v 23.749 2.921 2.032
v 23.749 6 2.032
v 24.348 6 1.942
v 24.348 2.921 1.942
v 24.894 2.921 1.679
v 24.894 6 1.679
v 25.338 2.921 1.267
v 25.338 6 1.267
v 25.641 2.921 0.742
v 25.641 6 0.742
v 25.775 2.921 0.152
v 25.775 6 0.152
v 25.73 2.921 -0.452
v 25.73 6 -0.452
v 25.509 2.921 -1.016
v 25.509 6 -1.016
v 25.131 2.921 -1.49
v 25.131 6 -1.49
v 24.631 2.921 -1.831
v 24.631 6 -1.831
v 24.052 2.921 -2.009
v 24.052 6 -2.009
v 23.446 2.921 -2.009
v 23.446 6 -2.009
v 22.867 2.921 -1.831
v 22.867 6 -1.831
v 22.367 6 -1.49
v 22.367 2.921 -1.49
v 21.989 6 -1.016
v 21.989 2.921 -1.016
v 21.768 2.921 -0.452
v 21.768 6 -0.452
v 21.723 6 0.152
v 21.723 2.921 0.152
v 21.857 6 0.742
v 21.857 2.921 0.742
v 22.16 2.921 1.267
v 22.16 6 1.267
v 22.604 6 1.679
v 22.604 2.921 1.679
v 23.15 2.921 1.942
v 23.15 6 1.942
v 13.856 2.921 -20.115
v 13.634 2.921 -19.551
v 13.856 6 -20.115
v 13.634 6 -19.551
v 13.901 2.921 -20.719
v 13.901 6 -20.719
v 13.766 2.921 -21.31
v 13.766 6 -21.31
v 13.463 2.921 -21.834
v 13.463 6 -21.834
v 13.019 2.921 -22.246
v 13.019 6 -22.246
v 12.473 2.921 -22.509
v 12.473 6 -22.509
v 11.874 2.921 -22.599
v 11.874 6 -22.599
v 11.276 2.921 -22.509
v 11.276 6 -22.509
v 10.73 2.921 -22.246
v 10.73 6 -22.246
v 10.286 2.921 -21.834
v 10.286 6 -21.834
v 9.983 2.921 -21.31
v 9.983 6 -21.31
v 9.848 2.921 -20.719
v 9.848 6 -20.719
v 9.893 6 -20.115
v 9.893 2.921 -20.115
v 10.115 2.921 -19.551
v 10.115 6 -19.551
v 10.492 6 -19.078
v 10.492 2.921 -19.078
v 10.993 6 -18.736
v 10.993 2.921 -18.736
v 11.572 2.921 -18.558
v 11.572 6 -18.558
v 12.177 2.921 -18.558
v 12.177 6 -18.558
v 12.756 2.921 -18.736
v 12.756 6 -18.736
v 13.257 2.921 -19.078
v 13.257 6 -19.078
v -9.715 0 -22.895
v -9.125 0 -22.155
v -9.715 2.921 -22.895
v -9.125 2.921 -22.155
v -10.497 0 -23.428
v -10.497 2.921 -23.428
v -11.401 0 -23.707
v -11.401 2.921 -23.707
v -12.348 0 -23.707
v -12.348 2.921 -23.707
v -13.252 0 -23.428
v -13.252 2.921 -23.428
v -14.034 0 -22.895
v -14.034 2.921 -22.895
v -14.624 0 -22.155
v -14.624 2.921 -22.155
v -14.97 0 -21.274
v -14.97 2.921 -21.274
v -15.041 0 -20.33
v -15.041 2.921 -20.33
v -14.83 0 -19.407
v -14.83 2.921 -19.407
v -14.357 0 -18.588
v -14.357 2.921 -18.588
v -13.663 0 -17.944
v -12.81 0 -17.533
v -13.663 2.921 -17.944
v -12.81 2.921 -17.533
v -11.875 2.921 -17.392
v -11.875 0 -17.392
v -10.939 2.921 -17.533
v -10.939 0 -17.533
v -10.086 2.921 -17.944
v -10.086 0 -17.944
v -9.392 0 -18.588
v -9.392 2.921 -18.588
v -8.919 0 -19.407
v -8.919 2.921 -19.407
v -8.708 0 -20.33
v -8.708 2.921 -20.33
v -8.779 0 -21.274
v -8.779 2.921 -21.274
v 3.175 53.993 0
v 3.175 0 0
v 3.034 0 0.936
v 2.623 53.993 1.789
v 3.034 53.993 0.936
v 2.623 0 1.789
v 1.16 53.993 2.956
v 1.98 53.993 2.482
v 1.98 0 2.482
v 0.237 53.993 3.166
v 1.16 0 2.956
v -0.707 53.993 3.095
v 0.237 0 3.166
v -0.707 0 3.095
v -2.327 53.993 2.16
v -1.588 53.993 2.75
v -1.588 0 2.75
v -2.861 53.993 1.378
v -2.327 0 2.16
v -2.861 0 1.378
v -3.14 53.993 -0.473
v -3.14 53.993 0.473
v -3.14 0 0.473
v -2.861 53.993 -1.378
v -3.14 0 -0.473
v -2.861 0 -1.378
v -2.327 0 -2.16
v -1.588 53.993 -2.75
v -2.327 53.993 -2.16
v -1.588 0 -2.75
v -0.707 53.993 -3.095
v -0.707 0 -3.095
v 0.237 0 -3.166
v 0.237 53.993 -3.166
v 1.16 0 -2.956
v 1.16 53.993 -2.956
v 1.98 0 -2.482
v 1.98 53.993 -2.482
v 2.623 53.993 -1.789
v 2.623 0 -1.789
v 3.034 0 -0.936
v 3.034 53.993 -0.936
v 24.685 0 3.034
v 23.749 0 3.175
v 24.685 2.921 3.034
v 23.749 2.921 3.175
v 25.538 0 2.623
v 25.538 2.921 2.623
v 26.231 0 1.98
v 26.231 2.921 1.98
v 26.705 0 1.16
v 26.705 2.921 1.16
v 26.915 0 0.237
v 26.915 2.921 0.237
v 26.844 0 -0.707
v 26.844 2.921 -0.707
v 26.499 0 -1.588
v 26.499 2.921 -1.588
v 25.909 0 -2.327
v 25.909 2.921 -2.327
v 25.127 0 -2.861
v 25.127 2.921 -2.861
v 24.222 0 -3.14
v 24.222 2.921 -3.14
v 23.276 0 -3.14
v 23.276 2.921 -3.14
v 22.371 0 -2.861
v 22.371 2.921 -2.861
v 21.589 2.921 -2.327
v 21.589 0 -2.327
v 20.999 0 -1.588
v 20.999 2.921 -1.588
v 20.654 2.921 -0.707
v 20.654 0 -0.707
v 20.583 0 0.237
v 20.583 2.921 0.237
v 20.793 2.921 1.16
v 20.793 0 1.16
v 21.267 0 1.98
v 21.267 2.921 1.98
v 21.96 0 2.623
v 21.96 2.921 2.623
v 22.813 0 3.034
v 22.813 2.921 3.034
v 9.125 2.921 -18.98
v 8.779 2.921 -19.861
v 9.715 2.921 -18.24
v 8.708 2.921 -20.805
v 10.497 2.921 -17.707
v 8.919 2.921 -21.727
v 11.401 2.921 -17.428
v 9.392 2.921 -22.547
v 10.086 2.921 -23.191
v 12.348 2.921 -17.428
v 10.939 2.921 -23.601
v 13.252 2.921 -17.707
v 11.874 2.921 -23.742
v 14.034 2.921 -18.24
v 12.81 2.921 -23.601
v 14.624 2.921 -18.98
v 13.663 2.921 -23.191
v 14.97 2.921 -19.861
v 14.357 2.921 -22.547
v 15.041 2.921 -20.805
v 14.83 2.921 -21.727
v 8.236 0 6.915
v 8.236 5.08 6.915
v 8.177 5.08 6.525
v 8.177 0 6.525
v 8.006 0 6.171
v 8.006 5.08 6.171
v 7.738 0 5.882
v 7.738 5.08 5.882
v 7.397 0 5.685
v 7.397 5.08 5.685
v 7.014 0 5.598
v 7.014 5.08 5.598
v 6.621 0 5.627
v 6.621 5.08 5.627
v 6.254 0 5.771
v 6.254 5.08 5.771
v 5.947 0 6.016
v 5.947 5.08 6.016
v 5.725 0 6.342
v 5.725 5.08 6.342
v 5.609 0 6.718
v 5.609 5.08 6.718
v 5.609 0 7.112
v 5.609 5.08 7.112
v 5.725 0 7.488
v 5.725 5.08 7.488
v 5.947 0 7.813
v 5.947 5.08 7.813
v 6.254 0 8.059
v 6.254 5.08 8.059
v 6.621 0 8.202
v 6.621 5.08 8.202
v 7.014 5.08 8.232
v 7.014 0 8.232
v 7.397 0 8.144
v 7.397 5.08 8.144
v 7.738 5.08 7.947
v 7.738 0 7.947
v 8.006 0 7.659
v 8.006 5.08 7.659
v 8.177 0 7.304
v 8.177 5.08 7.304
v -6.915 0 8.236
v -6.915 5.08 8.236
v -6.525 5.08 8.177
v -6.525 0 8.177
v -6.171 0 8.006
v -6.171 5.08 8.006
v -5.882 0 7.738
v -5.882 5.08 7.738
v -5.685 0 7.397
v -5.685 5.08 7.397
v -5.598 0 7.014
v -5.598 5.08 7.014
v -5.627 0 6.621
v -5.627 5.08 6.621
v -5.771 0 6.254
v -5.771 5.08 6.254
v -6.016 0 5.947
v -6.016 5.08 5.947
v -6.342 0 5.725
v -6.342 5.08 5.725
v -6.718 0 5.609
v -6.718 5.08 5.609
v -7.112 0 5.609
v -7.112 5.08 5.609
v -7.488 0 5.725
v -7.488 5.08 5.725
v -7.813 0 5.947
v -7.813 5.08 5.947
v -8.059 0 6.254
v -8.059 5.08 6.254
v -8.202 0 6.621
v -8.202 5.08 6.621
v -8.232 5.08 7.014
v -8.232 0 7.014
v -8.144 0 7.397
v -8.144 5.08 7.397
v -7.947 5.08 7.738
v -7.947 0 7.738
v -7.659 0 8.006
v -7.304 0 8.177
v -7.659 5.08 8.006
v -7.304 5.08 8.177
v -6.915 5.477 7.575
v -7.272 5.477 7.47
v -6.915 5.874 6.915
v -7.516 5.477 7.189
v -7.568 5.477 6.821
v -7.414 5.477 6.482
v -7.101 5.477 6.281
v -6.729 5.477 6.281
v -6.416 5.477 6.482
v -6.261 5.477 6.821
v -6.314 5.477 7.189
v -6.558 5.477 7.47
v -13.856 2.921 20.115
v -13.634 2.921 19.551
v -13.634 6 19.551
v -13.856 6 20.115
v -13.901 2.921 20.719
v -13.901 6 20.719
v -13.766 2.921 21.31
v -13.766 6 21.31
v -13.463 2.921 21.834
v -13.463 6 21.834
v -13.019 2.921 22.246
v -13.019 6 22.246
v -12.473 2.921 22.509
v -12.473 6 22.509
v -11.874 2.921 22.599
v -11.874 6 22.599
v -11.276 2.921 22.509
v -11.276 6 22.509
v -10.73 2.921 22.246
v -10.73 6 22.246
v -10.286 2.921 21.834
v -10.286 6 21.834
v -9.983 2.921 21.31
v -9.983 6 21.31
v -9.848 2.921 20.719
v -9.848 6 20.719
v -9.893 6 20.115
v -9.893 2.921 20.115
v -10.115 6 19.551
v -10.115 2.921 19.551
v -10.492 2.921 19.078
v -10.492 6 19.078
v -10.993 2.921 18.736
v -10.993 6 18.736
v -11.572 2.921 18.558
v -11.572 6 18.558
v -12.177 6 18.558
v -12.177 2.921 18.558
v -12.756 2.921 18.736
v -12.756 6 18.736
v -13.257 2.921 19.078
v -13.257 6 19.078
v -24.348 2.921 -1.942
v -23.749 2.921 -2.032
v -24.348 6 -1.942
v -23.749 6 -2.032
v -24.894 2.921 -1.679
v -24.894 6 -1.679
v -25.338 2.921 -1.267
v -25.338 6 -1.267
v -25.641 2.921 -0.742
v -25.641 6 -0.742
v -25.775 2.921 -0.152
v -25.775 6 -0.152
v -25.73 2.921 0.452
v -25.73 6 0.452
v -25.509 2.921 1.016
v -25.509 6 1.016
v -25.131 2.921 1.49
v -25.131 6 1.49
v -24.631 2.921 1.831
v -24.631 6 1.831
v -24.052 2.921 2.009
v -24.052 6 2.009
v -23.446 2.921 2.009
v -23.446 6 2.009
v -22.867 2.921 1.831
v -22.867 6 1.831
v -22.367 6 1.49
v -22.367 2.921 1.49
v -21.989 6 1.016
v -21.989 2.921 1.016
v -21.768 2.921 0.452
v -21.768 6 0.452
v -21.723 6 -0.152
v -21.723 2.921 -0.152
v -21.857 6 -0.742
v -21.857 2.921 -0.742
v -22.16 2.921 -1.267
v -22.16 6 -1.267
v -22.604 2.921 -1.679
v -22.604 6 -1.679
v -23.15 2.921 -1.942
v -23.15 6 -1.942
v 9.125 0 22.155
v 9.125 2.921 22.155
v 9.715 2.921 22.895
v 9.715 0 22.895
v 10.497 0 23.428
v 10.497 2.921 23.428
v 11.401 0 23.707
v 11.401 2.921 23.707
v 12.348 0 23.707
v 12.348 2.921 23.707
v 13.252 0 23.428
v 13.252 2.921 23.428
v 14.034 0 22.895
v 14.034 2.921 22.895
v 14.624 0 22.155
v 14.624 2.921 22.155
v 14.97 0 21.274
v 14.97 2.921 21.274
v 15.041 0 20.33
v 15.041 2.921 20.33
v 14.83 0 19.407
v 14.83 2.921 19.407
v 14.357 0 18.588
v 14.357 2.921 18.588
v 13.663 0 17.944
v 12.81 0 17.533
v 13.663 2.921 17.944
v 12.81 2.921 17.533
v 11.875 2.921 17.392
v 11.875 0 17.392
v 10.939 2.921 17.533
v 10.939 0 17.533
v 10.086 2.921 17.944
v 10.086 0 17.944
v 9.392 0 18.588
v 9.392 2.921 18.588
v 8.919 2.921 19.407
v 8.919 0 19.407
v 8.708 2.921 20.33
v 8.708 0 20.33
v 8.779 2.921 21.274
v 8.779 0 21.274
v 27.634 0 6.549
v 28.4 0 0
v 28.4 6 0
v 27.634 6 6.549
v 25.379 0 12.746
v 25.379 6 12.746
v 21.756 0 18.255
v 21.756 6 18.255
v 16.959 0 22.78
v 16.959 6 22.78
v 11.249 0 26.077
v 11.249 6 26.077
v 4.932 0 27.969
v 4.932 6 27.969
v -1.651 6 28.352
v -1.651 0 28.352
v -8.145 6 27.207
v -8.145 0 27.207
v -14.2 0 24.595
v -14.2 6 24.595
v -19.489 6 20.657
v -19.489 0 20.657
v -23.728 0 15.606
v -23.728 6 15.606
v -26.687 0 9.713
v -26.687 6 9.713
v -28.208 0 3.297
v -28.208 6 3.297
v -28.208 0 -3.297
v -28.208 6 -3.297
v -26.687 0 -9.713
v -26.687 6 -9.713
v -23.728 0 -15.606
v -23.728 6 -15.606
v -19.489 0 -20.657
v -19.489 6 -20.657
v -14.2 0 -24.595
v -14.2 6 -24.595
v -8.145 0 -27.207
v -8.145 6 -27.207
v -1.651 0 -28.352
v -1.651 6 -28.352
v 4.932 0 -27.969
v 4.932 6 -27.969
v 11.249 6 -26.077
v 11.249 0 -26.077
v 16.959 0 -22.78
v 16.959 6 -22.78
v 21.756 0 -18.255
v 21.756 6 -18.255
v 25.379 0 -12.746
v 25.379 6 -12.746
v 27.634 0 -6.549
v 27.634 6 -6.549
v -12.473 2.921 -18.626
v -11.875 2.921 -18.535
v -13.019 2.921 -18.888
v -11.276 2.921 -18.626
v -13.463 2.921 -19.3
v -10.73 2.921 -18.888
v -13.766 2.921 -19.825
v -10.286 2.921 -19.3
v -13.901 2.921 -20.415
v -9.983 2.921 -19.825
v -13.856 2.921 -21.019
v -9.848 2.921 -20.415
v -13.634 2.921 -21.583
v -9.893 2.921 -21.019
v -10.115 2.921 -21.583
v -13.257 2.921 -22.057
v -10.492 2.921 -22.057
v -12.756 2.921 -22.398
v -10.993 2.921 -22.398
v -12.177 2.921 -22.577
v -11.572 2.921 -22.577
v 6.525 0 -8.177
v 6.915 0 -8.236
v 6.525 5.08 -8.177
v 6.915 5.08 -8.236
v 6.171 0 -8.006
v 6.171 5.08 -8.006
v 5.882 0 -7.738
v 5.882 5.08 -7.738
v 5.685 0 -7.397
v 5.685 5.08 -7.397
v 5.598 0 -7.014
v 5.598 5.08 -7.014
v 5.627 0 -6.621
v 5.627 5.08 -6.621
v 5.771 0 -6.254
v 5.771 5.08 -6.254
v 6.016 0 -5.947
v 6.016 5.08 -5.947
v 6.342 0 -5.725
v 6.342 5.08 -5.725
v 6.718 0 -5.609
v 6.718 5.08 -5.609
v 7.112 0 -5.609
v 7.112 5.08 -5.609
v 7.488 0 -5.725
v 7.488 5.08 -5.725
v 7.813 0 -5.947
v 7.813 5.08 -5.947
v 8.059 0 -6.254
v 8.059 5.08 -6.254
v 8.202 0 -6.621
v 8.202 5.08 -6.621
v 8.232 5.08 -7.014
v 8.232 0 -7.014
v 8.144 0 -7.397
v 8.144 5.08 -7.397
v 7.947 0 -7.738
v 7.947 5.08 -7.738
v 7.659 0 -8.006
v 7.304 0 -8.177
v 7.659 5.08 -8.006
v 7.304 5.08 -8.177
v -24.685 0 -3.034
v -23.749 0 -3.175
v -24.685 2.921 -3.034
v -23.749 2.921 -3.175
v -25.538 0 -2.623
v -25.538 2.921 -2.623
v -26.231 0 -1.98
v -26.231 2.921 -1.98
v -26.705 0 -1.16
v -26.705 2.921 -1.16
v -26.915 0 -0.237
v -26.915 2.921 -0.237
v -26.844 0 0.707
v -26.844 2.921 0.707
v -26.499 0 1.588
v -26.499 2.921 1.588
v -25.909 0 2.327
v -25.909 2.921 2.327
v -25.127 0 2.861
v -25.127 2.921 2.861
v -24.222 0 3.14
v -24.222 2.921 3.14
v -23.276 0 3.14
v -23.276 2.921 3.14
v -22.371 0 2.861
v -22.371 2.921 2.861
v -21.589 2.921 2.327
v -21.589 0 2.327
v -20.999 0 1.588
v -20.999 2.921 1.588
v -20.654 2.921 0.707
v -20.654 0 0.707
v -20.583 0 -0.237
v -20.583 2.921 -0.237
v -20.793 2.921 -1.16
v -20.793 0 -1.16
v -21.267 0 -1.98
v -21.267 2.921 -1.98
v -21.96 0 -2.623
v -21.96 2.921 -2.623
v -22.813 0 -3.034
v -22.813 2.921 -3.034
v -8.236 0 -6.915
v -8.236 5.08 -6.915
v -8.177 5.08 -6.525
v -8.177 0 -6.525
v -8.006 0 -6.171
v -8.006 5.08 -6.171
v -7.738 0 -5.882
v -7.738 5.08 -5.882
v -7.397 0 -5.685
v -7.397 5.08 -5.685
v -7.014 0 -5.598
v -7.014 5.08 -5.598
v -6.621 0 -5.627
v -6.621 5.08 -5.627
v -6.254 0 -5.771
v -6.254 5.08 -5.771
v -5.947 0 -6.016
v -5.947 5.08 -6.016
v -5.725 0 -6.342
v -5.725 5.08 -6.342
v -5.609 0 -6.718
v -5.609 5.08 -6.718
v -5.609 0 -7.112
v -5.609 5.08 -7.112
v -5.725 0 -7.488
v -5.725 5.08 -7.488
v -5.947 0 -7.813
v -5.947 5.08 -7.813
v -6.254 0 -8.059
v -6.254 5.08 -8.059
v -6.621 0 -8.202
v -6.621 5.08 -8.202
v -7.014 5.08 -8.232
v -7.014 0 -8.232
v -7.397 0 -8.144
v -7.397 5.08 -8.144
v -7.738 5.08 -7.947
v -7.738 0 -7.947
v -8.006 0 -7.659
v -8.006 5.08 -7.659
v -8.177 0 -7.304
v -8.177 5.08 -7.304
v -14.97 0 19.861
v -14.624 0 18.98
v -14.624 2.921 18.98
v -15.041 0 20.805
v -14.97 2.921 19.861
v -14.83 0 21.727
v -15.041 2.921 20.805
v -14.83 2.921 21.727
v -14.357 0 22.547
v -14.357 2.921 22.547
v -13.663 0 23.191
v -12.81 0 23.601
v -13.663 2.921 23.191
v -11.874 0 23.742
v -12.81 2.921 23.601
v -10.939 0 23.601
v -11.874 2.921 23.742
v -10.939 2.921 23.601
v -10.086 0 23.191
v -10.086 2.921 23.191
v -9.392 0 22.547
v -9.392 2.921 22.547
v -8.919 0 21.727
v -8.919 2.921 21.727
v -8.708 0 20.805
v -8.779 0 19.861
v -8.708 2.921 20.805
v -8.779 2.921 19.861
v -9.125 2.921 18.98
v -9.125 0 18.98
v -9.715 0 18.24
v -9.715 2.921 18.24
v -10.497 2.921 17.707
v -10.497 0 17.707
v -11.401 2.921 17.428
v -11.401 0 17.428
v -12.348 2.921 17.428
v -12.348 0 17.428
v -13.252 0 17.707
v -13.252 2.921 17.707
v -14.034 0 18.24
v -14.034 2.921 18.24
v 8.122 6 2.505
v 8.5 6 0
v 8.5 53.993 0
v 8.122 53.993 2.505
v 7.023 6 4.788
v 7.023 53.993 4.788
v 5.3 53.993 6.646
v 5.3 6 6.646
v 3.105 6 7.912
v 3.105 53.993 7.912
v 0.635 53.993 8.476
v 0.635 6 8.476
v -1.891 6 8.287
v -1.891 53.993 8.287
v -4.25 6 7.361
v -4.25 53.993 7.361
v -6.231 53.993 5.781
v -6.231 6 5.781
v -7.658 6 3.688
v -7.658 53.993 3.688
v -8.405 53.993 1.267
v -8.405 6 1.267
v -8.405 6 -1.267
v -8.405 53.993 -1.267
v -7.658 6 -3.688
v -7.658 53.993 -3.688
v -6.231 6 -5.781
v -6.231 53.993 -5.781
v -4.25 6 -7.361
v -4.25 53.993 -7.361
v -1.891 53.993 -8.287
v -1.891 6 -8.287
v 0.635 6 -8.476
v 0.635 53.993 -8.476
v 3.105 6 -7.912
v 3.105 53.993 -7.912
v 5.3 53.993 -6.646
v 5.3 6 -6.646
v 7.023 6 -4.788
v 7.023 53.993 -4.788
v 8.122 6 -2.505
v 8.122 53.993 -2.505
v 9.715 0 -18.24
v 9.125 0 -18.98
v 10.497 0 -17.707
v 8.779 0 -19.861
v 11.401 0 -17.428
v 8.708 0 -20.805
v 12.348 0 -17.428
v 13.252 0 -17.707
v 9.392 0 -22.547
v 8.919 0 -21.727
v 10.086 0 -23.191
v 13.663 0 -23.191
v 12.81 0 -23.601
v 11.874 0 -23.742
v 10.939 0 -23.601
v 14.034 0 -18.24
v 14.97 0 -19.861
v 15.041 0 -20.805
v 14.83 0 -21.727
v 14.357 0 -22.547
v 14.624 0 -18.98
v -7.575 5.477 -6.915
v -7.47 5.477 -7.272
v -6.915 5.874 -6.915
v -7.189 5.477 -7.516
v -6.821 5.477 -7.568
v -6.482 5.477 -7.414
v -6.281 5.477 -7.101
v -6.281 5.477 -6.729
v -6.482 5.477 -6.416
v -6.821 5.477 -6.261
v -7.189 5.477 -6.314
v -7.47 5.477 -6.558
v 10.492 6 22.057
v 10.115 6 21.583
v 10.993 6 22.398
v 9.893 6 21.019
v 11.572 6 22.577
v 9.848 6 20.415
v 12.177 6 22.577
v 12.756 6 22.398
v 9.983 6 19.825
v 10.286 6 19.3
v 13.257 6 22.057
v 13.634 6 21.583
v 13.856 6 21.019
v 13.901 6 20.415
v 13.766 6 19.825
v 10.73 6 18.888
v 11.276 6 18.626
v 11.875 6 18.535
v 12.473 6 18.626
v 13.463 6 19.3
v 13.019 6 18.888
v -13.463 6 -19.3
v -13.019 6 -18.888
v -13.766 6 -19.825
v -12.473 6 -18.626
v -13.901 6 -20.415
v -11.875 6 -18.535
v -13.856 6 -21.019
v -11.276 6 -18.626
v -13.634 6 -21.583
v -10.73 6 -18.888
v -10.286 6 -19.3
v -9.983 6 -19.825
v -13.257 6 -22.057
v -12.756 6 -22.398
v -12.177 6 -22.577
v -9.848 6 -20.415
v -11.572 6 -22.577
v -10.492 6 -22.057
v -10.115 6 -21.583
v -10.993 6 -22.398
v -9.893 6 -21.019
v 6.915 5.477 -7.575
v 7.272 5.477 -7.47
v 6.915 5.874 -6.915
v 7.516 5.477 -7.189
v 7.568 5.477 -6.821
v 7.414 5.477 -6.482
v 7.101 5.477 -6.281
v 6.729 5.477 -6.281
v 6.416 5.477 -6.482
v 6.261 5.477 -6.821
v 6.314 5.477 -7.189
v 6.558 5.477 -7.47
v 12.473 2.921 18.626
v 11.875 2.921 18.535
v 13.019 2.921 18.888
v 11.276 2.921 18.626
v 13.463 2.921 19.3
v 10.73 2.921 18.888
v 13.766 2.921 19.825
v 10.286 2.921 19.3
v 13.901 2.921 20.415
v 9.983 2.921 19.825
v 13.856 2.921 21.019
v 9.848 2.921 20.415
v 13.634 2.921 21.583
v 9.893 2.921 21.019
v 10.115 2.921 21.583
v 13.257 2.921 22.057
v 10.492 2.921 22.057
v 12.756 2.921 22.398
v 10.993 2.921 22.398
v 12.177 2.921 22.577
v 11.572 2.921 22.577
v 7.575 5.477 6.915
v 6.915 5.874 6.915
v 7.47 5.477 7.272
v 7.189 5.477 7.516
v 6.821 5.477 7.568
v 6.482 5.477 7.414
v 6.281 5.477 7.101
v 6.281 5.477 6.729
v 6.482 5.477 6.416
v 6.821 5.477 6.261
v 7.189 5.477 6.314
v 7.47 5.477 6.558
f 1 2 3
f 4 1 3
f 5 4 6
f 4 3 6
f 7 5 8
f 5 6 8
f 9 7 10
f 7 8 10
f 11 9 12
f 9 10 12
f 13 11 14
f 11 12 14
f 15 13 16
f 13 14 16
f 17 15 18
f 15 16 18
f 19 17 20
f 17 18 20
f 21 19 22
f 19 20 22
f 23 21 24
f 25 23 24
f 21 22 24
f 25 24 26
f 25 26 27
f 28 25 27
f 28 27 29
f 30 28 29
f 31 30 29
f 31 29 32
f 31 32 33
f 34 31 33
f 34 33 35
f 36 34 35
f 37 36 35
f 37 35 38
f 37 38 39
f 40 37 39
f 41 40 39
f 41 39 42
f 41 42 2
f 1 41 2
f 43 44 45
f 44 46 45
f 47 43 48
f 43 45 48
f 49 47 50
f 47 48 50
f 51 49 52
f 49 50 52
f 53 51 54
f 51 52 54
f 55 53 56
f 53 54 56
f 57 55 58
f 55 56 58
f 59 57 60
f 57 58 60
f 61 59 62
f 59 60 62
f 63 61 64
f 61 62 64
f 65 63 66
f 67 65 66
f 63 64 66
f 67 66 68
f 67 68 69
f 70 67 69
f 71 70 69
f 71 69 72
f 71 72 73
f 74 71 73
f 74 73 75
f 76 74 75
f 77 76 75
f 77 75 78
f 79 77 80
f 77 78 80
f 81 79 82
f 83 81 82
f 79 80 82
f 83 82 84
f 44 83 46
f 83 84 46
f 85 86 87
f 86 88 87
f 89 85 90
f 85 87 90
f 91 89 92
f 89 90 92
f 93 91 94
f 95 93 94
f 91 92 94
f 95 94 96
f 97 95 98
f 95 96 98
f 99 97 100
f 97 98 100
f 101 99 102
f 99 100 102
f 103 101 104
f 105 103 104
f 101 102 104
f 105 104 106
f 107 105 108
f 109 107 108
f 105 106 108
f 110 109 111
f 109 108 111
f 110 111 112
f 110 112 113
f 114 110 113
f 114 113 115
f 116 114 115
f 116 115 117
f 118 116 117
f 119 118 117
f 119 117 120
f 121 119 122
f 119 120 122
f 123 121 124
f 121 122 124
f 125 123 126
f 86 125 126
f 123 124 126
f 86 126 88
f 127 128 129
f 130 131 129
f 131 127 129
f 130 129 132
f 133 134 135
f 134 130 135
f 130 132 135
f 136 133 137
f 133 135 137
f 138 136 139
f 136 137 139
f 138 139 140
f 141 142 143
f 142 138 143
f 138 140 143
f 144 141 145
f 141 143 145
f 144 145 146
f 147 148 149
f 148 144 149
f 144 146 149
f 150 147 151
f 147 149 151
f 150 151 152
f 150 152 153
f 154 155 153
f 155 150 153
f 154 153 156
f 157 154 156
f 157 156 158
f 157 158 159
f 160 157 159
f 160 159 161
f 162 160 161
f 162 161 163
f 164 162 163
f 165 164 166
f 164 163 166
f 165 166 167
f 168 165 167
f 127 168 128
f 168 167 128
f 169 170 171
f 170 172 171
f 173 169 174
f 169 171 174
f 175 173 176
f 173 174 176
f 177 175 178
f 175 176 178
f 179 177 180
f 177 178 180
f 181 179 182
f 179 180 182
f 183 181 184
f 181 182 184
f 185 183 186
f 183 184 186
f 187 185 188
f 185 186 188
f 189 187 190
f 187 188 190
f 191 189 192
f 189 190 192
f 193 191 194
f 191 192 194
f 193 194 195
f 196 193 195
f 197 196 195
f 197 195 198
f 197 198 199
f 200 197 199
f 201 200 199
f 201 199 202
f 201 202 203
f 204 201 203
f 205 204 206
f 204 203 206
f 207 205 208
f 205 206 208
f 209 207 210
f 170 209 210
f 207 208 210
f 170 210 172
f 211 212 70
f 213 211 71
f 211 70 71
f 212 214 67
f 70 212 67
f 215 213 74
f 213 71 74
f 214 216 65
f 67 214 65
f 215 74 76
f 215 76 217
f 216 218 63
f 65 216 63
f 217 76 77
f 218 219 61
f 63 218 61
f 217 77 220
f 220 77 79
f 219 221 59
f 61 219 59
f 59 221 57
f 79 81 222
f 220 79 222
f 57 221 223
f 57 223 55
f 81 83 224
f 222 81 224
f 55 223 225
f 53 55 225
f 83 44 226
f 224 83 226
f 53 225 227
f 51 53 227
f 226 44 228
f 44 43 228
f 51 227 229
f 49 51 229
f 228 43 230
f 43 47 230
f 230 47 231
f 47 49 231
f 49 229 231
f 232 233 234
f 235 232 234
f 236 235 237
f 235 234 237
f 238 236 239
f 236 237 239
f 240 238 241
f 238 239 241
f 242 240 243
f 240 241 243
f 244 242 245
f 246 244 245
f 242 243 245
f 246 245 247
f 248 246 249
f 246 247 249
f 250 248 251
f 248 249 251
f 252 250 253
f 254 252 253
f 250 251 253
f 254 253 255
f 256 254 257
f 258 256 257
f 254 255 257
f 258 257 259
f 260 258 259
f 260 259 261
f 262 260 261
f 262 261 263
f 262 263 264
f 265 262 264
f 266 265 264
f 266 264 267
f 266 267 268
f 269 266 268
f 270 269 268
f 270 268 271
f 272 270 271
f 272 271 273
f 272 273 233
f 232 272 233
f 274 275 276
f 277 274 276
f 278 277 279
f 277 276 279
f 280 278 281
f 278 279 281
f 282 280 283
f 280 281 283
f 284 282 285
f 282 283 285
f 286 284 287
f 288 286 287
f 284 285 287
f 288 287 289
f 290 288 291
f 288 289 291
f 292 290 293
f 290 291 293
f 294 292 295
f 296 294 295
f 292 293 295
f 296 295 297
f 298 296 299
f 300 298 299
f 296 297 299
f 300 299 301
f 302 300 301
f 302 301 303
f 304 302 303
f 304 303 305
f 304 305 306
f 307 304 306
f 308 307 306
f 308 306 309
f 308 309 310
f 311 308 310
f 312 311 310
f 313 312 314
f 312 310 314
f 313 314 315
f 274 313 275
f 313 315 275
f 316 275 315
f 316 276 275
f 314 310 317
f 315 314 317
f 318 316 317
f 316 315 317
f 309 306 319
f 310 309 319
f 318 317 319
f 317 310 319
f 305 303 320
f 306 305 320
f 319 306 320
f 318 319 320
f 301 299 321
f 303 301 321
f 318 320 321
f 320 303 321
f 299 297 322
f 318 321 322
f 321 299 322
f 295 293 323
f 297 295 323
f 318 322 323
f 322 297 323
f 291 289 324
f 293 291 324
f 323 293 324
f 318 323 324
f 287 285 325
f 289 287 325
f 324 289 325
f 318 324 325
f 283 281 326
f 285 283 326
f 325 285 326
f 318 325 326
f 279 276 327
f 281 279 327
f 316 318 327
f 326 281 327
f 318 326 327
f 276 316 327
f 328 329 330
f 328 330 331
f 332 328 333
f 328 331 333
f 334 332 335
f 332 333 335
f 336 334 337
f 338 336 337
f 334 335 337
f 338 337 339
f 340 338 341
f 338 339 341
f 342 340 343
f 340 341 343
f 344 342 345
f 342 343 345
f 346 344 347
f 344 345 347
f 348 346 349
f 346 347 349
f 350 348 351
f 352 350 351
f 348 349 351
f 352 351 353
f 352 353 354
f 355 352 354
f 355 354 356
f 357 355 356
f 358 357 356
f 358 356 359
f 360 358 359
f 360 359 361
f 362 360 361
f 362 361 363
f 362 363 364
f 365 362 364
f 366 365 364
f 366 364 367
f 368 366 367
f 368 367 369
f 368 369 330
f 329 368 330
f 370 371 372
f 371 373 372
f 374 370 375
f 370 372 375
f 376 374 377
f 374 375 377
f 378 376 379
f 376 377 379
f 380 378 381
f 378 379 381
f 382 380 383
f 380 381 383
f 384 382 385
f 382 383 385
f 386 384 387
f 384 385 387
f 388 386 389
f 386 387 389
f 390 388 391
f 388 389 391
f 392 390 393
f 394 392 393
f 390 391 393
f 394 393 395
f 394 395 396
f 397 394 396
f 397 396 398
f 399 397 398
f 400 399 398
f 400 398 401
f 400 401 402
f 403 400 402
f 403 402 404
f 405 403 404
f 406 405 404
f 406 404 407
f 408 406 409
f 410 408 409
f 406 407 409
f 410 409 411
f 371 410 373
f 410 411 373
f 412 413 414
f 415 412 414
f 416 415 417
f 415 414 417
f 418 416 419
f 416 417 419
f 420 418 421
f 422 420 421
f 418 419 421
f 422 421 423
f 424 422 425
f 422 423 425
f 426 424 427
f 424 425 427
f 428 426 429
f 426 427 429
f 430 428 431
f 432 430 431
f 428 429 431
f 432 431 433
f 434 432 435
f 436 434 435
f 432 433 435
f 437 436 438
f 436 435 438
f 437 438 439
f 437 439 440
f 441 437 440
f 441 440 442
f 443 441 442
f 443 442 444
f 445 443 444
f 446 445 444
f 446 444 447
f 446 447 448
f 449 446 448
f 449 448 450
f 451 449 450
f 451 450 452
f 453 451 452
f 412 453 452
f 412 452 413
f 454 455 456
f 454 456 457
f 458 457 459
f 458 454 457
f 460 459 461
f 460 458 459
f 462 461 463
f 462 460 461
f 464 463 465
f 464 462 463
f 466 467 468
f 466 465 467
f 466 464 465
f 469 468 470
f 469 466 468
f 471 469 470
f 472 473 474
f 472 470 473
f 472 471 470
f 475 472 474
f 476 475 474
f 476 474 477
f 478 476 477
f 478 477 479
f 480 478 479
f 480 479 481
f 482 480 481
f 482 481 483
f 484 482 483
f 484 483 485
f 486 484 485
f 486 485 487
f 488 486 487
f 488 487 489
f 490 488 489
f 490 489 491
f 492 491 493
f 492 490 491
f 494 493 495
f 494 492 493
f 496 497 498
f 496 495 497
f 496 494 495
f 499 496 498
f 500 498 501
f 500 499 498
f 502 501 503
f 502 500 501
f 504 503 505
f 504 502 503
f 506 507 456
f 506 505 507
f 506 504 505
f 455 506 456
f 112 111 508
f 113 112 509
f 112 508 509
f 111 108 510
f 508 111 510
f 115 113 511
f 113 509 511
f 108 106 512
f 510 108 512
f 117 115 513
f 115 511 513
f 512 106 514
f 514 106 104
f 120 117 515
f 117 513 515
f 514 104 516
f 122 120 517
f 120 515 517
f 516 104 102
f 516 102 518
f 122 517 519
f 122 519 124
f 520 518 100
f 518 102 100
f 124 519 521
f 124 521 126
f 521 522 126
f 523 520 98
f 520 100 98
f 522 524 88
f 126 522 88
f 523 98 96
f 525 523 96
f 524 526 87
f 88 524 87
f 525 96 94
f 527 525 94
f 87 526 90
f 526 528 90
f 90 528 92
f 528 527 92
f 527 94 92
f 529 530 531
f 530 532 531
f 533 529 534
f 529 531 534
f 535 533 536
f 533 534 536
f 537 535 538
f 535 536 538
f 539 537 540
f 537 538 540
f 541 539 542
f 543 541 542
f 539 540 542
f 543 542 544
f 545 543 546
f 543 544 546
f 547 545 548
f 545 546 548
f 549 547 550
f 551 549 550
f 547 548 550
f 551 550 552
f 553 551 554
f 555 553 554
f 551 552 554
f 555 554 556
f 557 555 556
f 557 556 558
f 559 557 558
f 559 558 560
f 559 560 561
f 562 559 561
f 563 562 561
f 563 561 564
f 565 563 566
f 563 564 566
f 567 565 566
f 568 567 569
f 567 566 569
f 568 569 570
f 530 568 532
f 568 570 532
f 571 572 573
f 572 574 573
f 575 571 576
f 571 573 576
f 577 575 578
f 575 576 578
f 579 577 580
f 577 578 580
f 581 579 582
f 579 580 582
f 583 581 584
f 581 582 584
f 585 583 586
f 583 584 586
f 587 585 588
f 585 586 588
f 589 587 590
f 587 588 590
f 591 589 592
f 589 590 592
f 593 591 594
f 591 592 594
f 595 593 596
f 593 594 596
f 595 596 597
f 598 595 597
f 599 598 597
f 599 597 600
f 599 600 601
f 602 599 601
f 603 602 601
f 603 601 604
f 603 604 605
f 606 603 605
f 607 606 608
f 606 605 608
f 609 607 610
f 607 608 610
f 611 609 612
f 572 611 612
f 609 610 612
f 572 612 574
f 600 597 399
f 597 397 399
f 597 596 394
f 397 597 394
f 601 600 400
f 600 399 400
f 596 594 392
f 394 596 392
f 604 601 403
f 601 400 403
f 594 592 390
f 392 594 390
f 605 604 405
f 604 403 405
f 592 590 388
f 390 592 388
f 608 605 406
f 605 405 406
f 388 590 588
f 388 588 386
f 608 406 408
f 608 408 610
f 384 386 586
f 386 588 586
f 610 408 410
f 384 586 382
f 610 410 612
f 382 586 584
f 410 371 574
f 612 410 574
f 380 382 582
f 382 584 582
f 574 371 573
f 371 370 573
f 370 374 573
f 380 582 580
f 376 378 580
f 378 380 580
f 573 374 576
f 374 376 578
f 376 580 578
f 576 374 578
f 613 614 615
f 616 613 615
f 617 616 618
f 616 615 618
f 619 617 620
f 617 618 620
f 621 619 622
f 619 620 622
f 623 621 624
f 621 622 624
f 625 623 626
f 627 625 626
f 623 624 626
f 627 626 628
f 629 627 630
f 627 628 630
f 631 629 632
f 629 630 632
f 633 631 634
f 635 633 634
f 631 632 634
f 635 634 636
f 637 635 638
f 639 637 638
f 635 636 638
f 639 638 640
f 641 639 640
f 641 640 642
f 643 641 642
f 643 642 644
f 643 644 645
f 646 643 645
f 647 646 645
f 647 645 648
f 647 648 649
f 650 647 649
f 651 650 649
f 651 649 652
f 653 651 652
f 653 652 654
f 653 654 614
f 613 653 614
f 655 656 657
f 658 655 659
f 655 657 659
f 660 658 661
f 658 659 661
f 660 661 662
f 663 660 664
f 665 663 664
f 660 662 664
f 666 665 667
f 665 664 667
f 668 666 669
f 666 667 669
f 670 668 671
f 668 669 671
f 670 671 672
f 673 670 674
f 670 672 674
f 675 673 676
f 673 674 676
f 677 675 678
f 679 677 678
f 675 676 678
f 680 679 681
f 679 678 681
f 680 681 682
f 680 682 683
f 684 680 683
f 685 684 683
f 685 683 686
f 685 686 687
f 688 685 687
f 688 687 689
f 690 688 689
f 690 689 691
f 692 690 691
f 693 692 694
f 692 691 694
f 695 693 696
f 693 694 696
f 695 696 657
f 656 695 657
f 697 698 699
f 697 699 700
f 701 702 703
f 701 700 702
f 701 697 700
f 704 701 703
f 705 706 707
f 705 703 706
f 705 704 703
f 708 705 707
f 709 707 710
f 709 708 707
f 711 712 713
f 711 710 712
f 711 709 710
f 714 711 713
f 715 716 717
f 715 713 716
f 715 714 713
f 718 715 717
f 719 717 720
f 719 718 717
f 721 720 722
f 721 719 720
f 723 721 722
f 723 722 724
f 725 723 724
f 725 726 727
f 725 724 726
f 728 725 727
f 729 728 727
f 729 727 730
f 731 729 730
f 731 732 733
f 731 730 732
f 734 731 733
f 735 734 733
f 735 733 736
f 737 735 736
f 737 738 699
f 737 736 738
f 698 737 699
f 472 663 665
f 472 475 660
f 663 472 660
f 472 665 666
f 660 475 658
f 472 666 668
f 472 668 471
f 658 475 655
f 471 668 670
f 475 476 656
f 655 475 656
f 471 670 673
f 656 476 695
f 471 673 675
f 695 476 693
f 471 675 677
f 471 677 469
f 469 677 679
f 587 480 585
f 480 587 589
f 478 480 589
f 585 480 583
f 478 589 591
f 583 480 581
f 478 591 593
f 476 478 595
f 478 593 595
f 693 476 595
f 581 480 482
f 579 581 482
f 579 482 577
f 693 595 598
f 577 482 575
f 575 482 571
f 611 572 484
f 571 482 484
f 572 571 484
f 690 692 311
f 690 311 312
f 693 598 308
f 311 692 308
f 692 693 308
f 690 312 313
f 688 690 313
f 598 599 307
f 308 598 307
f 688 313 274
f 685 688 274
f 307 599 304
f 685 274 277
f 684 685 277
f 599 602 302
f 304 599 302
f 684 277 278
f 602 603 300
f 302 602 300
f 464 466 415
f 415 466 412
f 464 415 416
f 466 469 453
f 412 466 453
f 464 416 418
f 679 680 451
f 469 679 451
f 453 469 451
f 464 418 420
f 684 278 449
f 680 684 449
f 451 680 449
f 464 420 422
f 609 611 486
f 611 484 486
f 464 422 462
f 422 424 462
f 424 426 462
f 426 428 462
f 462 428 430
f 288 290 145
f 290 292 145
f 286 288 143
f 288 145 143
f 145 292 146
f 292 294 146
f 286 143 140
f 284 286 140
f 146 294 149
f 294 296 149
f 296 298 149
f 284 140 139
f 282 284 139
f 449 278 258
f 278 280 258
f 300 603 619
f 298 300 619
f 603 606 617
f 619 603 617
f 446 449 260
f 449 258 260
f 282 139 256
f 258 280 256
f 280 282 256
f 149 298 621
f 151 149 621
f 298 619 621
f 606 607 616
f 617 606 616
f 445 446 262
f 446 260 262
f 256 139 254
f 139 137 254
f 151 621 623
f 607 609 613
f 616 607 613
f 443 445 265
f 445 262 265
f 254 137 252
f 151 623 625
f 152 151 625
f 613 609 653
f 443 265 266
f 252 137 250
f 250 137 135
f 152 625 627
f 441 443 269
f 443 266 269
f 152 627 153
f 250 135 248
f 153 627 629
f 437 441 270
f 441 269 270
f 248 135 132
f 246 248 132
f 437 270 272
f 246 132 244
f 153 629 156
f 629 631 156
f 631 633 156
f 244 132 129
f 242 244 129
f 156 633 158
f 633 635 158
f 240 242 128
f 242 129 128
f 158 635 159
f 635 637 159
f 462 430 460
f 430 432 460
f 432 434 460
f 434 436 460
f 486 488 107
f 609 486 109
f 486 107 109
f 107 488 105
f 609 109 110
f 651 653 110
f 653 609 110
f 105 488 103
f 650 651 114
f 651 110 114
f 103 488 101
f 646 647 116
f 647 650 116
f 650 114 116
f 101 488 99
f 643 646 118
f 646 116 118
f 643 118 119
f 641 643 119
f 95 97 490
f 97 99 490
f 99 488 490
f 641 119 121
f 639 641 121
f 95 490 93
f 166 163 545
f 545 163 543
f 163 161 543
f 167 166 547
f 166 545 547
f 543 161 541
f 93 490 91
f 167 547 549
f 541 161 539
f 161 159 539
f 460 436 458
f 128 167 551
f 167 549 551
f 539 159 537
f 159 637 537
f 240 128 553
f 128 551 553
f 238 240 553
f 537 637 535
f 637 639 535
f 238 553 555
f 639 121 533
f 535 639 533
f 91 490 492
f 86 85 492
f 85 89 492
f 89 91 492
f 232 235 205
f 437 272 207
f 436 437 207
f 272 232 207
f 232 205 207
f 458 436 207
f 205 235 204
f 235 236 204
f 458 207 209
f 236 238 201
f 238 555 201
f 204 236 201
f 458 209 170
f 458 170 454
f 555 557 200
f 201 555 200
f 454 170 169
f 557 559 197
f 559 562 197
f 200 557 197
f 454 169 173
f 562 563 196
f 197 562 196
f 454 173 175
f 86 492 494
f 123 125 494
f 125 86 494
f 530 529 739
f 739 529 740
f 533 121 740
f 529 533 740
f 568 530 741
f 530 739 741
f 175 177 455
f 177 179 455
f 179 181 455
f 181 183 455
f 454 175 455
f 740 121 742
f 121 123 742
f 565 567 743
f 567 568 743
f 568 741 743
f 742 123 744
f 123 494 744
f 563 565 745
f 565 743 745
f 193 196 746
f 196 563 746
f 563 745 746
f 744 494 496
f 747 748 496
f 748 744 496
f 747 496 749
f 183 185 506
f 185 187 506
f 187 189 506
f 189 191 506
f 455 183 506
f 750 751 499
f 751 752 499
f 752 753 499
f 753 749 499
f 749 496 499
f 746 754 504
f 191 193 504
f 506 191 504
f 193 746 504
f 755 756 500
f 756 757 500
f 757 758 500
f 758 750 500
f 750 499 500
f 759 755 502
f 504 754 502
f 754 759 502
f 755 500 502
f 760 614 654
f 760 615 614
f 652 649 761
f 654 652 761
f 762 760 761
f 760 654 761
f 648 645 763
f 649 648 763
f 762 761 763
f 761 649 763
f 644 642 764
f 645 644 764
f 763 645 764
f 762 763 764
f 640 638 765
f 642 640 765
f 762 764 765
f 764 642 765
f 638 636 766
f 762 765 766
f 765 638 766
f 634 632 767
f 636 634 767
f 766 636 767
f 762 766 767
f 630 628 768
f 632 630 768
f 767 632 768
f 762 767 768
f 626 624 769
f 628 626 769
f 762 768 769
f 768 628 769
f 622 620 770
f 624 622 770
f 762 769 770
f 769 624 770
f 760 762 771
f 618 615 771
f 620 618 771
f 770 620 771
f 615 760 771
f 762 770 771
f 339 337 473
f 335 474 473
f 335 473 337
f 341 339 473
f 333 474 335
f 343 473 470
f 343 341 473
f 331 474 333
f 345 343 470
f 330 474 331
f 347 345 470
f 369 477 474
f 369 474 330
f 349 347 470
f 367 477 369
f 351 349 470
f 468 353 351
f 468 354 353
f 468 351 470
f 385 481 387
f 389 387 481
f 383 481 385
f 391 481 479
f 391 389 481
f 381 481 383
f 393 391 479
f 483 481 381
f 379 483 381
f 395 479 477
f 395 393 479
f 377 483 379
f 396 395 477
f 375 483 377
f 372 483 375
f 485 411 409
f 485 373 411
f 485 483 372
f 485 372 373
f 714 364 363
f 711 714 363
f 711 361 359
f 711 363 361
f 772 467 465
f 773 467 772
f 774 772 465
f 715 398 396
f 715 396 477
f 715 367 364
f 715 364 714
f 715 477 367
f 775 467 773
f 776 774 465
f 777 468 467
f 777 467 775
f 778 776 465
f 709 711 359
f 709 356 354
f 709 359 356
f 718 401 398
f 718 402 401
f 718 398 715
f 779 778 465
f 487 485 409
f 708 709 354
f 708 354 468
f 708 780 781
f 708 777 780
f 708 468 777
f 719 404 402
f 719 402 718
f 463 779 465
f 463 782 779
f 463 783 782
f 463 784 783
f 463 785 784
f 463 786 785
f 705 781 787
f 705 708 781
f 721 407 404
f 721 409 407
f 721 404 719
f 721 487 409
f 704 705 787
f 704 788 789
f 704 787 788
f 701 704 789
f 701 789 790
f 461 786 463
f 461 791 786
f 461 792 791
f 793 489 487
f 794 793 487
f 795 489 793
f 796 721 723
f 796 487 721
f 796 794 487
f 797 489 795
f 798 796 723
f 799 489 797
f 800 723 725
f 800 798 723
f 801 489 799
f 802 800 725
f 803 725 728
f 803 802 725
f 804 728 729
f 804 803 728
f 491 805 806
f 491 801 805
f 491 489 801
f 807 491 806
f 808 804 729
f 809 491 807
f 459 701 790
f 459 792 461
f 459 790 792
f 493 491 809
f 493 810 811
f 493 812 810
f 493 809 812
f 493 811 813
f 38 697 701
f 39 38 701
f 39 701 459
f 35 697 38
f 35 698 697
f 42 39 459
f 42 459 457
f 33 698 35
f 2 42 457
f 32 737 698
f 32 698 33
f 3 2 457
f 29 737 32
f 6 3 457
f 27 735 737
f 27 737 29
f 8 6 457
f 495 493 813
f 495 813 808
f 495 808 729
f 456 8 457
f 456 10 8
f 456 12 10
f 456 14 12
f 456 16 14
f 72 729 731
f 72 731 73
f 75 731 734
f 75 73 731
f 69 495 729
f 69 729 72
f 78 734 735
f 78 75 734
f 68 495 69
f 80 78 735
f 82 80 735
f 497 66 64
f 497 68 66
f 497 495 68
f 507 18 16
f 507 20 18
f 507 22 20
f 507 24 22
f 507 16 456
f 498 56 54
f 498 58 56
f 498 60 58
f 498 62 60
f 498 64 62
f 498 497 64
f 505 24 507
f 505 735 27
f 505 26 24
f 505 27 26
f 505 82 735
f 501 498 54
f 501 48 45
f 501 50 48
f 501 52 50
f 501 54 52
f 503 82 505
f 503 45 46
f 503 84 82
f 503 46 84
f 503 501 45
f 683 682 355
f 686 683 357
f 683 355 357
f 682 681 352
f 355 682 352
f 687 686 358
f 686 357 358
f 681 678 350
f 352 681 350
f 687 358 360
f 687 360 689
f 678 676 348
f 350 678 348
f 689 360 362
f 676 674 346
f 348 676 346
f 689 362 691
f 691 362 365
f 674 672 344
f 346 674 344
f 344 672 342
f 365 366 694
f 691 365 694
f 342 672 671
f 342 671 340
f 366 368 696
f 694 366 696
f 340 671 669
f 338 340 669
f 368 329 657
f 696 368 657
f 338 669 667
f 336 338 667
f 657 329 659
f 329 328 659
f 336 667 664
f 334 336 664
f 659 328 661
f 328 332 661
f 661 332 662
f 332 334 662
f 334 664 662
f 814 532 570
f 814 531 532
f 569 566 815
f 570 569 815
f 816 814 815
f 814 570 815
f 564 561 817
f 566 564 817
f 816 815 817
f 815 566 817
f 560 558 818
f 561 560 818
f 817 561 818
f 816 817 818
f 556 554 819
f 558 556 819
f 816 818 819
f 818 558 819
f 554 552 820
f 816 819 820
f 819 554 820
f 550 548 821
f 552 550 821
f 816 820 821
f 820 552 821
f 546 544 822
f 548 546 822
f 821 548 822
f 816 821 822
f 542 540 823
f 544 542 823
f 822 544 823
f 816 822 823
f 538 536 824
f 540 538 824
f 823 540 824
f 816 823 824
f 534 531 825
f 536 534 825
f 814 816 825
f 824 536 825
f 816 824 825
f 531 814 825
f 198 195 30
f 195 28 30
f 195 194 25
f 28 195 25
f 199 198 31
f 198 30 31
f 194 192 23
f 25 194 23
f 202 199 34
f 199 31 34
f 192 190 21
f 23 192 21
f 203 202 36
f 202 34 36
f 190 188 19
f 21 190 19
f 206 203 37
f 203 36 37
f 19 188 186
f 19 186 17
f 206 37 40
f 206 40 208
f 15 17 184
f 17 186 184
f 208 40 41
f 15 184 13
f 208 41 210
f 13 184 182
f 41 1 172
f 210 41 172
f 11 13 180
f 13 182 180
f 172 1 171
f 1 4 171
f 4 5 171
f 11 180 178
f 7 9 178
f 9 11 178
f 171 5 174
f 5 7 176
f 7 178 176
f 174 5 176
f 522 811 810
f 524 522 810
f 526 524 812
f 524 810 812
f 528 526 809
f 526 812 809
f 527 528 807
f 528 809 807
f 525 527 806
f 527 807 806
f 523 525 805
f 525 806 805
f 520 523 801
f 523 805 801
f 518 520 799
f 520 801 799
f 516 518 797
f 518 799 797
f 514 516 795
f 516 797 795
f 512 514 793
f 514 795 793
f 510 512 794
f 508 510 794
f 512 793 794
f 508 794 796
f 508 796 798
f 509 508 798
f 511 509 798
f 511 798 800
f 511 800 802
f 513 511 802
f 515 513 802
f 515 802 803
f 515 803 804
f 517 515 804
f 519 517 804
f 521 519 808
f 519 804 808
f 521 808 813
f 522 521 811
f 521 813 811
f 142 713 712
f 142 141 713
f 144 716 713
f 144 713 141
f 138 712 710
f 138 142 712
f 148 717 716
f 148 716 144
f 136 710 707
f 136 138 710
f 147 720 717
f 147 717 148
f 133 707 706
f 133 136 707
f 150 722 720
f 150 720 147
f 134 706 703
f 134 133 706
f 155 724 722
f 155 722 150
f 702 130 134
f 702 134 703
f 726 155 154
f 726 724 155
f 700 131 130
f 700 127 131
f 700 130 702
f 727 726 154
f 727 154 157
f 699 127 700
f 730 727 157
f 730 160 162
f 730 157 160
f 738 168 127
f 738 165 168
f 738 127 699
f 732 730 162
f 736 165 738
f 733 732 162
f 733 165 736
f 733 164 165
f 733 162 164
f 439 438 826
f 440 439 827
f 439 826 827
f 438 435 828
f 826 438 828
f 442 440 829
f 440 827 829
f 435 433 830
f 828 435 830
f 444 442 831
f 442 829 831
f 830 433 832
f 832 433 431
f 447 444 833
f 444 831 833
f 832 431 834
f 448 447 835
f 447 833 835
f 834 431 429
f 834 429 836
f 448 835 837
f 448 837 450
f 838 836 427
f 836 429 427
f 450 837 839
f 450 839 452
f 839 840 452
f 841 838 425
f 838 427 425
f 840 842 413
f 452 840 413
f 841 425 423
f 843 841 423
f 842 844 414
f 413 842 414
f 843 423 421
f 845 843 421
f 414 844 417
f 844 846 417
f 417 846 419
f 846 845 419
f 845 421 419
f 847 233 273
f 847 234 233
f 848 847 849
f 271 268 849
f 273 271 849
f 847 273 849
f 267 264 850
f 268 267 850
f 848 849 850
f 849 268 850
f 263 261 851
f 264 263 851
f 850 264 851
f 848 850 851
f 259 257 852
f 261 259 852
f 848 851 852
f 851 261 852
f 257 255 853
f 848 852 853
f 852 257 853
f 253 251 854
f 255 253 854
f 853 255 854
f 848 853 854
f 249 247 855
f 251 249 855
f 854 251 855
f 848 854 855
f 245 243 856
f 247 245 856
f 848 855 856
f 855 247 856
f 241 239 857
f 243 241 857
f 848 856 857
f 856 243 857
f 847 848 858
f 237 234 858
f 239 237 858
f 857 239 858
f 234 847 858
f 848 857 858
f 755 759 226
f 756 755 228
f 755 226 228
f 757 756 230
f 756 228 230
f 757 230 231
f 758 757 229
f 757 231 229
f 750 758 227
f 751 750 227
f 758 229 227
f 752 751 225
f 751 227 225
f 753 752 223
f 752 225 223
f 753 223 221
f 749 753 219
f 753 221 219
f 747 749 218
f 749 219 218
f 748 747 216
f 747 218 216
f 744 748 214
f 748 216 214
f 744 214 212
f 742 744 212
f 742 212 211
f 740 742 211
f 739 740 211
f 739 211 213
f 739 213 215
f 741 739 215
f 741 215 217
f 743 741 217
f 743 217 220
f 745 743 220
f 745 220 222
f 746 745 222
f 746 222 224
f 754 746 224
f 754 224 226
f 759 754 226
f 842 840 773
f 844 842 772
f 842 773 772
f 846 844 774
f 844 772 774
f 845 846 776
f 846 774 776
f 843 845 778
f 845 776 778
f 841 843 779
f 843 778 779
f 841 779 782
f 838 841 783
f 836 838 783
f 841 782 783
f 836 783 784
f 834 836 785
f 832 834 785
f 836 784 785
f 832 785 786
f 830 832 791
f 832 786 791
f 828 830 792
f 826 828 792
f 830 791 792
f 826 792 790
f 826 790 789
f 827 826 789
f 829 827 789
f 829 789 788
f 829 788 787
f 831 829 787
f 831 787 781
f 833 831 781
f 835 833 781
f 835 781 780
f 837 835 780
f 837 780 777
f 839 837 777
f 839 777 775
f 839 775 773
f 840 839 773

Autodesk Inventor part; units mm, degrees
ref_plane "YZ Plane" through (0, 0, 0) normal (1, 0, 0) x (0, 1, 0)
ref_plane "XZ Plane" through (0, 0, 0) normal (0, 1, 0) x (-1, 0, 0)
ref_plane "XY Plane" through (0, 0, 0) normal (0, 0, 1) x (1, 0, 0)
sketch "Sketch1" plane through (0, 0, 0) normal (0, 0, 1) x (1, 0, 0)
  line L0 (0, 0) -> (0, 26.4) construction
  line L1 (3.175, 0) -> (28.4, 0)
  line L2 (8.5, 6) -> (28.4, 6)
  line L3 (8.5, 53.9934) -> (8.5, 6)
  line L4 (28.4, 6) -> (28.4, 0)
  line L5 (3.175, 53.9934) -> (8.5, 53.9934)
  line L6 (3.175, 53.9934) -> (3.175, 0)
  dimension "d0" = 26.4
  dimension "d53" = 47.9934
revolve "Revolution1" add sketch "Sketch1" angle 360 about axis through (0, 0, 0) along (0, 1, 0)
sketch "Sketch5" plane through (0, 0, 0) normal (0, -1, 0) x (1, 0, 0)
  circle A0 centre (0, 0) radius 3.175 projected
  line L0 (0, 0) -> (6.9148, -6.9148)
  line L1 (0, 0) -> (9.779, 0) construction
  dimension "d39" = 9.779
  dimension "d40" = 45
hole "Hole2" at (6.9148, 0, -6.9148) direction (0, 1, 0) diameter 2.6416 depth 5.08 tip angle 118 thread size "6-32 UNC" class "2B" standard "ANSI Unified Screw Threads"
pattern_circular "Circular Pattern2" count 4 over 360 about axis through (0, 26.9967, 0) along (0, -1, 0) of "Hole2"
sketch "Sketch6" plane through (0, 0, 0) normal (0, -1, 0) x (1, 0, 0)
  point P0 (0, 0)
sketch "Sketch7" plane through (0, 0, 0) normal (0, -1, 0) x (1, 0, 0)
  line L0 (0, 0) -> (-23.749, 0) construction
  dimension "d57" = 23.749
hole "Hole3" at (-23.749, 0, 0) direction (0, 1, 0) diameter 4.064 end through all counterbore diameter 6.35 counterbore depth 2.921
pattern_circular "Circular Pattern3" count 6 over 360 about axis through (0, 26.9967, 0) along (0, -1, 0) of "Hole3"
properties part number "Mechanum Wheel Adapter"
